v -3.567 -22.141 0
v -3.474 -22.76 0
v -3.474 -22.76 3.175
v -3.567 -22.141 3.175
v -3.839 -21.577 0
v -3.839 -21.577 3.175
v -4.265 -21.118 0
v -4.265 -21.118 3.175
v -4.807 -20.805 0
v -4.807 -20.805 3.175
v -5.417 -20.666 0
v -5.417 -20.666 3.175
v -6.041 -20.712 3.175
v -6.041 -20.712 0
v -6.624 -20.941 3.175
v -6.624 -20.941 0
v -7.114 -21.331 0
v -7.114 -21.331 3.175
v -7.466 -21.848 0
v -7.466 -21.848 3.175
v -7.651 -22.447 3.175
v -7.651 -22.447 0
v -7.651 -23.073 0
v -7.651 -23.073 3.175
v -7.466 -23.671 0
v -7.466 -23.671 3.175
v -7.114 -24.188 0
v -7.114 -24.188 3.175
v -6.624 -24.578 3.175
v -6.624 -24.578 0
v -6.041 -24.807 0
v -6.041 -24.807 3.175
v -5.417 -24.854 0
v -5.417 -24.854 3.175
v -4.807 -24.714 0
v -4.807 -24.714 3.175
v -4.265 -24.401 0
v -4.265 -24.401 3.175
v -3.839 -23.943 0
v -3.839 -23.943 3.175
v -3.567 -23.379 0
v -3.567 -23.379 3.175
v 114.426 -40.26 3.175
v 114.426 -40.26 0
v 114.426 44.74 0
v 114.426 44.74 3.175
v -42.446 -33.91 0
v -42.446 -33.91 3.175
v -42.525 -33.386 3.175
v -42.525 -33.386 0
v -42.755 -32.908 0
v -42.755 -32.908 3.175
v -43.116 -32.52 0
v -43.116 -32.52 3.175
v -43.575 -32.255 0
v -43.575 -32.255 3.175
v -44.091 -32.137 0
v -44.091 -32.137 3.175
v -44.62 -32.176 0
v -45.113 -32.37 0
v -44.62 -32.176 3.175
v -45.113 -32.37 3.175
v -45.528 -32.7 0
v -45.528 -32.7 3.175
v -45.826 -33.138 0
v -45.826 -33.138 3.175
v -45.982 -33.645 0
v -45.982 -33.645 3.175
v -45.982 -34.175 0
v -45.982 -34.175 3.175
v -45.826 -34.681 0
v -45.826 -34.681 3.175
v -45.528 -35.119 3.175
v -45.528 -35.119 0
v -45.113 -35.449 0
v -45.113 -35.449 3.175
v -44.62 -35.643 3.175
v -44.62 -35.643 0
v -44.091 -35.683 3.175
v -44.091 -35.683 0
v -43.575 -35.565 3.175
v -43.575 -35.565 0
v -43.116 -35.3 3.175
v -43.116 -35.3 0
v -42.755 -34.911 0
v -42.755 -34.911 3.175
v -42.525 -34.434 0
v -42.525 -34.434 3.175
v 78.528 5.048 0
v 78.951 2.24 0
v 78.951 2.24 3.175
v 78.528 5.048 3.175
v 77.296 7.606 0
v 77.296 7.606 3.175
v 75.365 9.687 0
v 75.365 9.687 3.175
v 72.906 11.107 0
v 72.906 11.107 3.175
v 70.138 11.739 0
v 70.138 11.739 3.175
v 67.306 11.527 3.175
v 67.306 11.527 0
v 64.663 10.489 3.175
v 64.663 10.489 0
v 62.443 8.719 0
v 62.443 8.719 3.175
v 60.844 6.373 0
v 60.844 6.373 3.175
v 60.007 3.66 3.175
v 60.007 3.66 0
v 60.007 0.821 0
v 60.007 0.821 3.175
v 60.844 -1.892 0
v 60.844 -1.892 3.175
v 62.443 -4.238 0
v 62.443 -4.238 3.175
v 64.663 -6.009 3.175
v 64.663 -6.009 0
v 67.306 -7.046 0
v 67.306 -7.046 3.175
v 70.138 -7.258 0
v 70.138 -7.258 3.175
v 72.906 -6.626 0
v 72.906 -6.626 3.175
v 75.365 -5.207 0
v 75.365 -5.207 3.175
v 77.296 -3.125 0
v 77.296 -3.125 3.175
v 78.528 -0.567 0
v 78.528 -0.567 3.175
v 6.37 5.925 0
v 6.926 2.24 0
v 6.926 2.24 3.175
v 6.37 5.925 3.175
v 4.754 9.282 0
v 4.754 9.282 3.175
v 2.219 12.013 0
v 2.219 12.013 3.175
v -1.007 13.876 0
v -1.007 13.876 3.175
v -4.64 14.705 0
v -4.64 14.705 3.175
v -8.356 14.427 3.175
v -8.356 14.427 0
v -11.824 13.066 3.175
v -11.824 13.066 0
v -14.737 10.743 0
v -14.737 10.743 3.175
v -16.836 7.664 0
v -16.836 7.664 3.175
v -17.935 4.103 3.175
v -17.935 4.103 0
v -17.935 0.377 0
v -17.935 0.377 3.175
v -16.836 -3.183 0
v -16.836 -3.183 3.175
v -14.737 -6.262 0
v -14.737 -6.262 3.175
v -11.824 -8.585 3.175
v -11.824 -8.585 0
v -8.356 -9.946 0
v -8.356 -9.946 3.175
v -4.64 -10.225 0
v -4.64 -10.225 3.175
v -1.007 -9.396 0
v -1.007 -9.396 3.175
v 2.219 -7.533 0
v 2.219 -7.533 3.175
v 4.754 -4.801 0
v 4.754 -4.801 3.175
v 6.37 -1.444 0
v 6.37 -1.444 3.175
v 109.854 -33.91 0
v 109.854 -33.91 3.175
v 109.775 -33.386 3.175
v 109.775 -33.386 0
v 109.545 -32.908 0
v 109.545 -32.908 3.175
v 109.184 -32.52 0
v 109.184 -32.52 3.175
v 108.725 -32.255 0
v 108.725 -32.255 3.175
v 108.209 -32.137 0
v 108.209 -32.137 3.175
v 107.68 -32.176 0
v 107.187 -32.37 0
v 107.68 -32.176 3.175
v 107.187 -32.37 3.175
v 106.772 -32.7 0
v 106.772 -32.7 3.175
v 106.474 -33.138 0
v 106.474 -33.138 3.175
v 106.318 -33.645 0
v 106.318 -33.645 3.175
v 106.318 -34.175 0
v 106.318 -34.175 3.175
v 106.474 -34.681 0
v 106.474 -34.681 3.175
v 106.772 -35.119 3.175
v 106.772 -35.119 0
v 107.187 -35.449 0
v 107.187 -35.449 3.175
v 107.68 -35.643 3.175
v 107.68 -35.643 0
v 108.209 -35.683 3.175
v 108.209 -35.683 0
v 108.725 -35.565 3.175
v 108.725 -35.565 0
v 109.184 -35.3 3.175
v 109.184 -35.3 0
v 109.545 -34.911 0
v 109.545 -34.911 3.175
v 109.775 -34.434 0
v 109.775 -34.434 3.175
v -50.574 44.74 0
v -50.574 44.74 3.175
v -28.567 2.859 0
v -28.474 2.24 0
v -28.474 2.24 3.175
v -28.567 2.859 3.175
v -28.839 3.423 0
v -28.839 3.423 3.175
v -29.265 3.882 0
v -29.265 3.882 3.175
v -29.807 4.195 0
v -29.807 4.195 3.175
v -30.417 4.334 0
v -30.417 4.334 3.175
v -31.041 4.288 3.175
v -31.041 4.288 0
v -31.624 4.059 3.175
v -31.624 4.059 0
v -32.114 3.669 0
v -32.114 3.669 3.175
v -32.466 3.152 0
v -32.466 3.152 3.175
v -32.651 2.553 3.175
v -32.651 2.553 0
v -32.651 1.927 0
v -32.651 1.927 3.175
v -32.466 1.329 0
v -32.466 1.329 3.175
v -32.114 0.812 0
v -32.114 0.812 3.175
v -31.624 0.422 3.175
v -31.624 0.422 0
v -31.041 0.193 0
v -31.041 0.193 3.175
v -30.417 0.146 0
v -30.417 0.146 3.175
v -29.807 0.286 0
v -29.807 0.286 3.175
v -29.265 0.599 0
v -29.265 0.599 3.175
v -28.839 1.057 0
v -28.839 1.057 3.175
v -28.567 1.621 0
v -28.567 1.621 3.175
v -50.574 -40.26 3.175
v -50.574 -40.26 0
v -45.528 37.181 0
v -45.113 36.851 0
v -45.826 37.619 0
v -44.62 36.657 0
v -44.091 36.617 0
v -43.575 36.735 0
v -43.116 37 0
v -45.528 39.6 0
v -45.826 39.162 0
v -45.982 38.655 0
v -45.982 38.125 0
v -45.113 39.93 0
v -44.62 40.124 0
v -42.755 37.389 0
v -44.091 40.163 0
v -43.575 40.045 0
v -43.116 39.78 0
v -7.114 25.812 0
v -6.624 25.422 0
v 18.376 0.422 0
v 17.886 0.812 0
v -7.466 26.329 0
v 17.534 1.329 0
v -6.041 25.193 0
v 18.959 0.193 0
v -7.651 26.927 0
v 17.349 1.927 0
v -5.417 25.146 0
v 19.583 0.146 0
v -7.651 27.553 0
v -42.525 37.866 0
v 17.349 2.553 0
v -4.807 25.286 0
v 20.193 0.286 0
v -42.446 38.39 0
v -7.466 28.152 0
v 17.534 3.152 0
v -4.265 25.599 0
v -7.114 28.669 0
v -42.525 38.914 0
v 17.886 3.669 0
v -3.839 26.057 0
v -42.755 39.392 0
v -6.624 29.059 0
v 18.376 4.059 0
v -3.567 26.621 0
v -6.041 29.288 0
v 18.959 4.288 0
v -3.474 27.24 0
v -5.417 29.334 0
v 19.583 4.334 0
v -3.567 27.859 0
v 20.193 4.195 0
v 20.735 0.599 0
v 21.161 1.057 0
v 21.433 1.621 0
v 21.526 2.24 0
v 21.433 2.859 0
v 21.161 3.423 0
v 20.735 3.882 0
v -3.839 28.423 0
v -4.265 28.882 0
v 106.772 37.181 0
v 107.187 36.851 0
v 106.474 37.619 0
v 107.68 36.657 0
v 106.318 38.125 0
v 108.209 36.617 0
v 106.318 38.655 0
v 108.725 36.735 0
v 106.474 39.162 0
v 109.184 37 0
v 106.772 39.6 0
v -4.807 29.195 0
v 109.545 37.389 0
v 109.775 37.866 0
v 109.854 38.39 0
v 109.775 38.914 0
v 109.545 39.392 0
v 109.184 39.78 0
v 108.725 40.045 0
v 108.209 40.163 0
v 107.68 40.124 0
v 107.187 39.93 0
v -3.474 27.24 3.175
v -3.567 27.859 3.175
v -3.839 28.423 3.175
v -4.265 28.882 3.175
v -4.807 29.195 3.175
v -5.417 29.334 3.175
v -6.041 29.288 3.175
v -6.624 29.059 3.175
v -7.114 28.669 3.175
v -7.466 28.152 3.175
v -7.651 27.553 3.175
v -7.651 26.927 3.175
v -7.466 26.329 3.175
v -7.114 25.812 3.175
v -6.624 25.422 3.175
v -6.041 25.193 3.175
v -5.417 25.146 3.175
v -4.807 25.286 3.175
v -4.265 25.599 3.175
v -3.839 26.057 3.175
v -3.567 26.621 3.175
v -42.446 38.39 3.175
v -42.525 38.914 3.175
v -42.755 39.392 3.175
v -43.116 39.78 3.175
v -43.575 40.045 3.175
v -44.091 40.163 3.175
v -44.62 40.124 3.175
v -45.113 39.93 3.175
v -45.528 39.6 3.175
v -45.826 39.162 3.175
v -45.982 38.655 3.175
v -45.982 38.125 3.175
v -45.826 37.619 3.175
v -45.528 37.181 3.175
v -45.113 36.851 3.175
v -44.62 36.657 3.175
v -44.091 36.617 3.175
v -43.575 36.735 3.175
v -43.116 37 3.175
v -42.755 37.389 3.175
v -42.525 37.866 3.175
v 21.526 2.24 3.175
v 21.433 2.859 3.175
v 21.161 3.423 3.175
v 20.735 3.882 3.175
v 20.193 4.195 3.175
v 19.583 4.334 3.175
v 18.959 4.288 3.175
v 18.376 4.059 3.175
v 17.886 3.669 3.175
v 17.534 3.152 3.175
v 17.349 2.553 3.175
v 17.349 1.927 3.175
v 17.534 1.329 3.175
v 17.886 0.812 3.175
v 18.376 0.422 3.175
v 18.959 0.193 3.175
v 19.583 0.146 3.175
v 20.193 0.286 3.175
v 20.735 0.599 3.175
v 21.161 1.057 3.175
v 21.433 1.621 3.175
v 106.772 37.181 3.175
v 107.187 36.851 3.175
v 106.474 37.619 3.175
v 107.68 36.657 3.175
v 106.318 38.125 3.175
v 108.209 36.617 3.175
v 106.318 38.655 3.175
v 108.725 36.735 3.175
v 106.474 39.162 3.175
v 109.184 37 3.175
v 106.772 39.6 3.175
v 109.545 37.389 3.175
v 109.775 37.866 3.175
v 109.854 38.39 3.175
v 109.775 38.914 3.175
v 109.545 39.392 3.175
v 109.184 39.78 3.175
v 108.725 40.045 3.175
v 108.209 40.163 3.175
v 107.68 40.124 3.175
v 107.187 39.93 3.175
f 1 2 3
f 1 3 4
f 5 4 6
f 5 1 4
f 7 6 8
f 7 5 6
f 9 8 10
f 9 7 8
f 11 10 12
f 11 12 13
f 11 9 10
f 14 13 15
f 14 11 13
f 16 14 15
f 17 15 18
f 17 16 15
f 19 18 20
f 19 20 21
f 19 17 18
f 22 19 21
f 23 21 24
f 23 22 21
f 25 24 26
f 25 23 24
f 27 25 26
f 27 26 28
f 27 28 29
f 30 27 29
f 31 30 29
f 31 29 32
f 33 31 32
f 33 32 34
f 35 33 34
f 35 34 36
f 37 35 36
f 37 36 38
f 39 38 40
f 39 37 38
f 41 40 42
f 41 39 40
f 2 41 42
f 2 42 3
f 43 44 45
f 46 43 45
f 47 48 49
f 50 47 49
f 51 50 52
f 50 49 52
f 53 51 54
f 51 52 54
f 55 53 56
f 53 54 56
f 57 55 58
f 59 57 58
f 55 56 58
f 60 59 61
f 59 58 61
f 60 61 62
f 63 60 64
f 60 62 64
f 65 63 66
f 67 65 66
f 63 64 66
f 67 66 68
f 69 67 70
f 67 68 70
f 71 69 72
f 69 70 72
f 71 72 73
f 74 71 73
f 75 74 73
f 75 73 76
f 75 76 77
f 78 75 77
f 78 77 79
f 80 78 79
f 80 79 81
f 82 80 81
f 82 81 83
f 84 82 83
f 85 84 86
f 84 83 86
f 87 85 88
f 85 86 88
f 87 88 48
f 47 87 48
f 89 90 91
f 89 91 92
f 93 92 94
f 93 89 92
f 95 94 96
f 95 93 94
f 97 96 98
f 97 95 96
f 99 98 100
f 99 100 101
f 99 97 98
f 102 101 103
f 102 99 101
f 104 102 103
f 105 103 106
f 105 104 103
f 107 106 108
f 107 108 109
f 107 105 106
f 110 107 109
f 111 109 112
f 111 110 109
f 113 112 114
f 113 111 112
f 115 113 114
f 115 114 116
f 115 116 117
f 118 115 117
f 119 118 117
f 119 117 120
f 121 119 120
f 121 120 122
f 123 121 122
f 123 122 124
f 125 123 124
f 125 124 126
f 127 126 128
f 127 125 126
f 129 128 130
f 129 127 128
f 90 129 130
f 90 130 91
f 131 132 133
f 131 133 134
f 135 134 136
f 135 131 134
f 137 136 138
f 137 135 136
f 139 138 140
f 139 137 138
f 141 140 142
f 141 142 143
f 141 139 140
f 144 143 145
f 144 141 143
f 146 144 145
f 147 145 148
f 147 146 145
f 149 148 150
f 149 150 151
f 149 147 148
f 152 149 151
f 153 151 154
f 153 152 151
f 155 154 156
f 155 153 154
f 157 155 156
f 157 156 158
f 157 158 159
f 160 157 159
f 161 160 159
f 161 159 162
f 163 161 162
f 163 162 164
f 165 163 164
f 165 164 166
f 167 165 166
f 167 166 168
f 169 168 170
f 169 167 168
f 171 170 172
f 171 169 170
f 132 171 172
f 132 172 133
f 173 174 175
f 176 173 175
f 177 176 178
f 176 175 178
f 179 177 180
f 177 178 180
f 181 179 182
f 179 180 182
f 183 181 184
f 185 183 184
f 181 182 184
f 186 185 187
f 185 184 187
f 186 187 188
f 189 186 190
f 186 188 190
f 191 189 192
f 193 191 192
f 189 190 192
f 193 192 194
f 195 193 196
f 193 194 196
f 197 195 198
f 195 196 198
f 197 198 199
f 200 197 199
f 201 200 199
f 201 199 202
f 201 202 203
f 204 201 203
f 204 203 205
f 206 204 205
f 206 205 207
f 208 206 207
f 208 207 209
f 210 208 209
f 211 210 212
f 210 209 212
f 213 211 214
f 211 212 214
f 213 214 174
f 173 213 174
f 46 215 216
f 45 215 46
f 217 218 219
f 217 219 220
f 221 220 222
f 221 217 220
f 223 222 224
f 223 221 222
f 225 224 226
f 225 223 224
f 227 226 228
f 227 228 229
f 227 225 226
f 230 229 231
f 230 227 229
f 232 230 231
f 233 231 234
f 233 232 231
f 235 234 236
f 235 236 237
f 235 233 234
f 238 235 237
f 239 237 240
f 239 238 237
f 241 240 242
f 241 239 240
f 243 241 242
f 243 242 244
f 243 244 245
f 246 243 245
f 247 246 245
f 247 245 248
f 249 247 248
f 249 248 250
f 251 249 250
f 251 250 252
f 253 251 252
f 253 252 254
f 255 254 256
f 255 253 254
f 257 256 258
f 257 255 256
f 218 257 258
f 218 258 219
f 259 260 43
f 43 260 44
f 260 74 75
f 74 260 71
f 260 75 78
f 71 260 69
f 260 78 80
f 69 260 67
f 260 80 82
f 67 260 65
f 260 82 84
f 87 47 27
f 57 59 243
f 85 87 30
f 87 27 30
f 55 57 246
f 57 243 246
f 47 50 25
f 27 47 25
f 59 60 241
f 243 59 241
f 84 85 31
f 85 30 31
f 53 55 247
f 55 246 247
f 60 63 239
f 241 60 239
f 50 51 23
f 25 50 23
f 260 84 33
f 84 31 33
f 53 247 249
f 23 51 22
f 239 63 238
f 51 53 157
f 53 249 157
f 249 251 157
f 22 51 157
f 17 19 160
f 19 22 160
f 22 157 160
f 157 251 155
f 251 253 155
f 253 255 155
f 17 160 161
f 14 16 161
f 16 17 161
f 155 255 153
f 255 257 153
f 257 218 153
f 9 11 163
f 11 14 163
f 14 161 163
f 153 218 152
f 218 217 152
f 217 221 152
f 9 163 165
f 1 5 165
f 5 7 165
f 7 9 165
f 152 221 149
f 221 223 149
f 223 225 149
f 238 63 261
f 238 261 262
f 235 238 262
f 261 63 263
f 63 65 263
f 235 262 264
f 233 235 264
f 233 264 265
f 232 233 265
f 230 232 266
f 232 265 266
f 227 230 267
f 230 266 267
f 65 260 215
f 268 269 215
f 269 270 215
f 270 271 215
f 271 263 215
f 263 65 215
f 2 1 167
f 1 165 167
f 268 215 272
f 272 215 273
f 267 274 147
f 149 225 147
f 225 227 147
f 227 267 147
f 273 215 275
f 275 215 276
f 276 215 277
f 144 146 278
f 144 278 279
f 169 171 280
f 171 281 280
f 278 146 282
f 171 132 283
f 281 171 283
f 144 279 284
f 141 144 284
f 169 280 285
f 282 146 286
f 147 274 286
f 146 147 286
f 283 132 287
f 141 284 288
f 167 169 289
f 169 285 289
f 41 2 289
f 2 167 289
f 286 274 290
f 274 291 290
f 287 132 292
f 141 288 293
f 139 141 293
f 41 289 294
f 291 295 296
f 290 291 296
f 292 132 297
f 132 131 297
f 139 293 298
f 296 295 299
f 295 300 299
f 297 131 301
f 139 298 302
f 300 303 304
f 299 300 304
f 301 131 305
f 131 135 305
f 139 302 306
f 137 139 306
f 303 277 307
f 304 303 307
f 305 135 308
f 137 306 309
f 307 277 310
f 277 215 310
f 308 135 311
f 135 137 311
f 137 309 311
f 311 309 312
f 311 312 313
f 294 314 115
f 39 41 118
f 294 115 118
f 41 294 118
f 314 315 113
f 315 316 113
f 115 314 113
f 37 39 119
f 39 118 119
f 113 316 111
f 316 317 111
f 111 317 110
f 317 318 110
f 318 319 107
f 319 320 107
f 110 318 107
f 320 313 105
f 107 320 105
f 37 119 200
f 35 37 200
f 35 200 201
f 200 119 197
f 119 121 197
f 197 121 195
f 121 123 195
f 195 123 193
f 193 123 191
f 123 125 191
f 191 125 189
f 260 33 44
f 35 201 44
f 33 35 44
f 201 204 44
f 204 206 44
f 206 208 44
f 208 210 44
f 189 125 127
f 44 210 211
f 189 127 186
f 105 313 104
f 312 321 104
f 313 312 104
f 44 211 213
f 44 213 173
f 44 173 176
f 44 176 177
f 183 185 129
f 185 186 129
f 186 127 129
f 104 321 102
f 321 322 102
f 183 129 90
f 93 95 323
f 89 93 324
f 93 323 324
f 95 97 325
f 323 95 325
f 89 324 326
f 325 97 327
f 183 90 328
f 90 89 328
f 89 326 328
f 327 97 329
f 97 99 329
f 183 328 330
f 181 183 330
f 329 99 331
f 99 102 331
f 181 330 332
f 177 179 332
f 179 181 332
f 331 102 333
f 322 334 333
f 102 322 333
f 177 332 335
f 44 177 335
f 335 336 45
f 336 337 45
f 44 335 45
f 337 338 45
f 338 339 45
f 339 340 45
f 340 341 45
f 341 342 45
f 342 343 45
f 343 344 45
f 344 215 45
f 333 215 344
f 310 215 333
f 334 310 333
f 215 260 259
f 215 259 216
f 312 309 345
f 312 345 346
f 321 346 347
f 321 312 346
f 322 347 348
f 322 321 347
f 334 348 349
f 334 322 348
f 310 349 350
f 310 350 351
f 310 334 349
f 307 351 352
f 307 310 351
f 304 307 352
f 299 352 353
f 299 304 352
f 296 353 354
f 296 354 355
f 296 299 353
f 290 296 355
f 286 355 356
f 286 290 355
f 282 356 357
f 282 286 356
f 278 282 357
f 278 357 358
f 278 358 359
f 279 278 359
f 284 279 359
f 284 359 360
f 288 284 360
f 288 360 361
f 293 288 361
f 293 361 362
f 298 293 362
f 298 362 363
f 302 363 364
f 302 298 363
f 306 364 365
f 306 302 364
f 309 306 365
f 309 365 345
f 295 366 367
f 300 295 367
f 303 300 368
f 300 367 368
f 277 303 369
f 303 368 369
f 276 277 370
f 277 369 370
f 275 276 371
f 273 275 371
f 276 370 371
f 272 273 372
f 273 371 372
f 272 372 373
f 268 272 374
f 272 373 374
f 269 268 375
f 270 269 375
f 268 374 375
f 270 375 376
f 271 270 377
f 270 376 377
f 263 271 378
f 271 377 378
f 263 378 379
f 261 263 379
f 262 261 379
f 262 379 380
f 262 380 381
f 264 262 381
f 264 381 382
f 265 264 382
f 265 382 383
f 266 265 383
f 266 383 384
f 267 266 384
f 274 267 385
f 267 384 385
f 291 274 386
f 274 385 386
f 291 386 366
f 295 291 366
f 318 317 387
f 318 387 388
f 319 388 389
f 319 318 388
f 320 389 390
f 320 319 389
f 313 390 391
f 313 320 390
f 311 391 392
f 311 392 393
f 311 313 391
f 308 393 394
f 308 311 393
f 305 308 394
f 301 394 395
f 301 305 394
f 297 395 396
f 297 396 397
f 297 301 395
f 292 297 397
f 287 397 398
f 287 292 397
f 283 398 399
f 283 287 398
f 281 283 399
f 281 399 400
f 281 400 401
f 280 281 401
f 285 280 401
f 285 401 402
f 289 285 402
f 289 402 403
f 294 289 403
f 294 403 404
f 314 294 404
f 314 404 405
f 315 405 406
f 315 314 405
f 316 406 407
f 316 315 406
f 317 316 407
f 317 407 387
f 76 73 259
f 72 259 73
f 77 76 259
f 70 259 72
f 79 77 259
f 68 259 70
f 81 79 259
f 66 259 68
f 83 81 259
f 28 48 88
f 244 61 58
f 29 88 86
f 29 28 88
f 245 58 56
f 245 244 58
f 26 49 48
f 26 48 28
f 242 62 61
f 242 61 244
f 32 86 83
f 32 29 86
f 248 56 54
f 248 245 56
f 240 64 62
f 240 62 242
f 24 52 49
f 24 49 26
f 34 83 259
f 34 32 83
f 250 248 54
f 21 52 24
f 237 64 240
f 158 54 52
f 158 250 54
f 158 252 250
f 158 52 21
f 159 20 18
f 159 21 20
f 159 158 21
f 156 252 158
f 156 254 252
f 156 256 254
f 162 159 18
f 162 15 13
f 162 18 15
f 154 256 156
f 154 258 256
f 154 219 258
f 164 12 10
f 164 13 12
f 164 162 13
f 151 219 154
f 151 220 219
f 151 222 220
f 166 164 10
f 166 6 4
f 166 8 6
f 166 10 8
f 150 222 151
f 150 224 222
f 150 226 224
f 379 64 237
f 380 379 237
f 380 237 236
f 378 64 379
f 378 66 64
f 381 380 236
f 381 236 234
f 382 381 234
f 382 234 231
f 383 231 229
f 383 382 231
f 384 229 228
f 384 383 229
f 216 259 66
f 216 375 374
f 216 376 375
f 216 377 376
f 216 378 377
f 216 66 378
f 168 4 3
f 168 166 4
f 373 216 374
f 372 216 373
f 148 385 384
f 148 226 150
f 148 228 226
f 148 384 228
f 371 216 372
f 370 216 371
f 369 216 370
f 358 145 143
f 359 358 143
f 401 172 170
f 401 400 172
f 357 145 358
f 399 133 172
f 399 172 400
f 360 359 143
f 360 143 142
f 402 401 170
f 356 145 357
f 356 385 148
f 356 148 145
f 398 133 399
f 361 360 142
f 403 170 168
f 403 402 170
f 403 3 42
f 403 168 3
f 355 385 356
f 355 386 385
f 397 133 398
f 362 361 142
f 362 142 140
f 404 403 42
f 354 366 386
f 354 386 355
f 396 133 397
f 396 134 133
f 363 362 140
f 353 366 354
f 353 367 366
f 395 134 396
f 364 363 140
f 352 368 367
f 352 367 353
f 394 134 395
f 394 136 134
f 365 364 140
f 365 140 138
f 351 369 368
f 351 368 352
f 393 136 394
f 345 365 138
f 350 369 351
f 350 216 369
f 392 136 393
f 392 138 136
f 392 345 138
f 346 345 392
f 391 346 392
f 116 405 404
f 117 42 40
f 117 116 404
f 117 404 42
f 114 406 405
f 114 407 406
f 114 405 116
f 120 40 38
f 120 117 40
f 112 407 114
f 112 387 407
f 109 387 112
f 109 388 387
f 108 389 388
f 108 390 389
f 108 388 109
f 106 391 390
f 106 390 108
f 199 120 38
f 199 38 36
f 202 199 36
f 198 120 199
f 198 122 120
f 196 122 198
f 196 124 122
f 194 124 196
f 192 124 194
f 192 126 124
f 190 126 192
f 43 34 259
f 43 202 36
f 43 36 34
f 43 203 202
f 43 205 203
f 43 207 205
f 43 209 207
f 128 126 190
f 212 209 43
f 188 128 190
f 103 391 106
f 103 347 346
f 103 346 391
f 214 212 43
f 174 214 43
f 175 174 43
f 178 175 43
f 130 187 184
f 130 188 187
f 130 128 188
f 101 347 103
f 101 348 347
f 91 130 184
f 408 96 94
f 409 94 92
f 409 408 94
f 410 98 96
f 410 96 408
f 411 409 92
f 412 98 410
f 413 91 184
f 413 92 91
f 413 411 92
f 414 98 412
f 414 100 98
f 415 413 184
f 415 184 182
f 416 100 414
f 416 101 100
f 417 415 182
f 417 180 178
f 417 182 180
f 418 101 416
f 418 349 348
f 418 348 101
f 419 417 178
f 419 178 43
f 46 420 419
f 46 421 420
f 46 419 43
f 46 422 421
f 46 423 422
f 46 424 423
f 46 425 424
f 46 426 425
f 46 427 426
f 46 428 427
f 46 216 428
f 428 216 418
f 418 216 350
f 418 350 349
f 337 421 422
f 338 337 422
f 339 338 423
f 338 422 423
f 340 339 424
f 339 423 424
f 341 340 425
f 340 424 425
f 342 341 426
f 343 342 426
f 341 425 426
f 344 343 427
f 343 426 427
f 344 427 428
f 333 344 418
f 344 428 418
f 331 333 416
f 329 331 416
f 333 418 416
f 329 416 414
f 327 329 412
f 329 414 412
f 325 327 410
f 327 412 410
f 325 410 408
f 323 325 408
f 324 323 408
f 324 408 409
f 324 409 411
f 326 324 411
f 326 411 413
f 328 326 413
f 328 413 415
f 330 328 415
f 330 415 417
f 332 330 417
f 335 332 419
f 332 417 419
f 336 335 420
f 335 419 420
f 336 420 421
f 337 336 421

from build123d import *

# Parameters (mm, degrees)
F0_W     = 165
F0_H     = 85
F0_R     = 2.1
F0_R_2   = 12.5
F0_R_3   = 9.525
F1_DEPTH = 3.175
F2_R     = 1.778
F3_DEPTH = 3.175


with BuildPart() as f1:
    # F0 (on Top) → F1 (new body)
    with BuildSketch(Plane.XY):
        with Locations((31.925802, 2.240353)):
            Rectangle(F0_W, F0_H)
        with Locations((-5.574198, -22.759647)):
            Circle(F0_R, mode=Mode.SUBTRACT)
        with Locations((-30.574198, 2.240353)):
            Circle(F0_R, mode=Mode.SUBTRACT)
        with Locations((-5.574198, 2.240353)):
            Circle(F0_R_2, mode=Mode.SUBTRACT)
        with Locations((19.425802, 2.240353)):
            Circle(F0_R, mode=Mode.SUBTRACT)
        with Locations((-5.574198, 27.240353)):
            Circle(F0_R, mode=Mode.SUBTRACT)
        with Locations((69.425802, 2.240353)):
            Circle(F0_R_3, mode=Mode.SUBTRACT)
    extrude(amount=F1_DEPTH)

    # F2 (on face) → F3 (cut, through all)
    with BuildSketch(Plane.XY.offset(3.175)):
        with Locations((-44.224198, 38.390353)):
            Circle(F2_R)
        with Locations((-44.224198, -33.909647)):
            Circle(F2_R)
        with Locations((108.075802, 38.390353)):
            Circle(F2_R)
        with Locations((108.075802, -33.909647)):
            Circle(F2_R)
    extrude(amount=-F3_DEPTH, mode=Mode.SUBTRACT)


solid = f1.part
